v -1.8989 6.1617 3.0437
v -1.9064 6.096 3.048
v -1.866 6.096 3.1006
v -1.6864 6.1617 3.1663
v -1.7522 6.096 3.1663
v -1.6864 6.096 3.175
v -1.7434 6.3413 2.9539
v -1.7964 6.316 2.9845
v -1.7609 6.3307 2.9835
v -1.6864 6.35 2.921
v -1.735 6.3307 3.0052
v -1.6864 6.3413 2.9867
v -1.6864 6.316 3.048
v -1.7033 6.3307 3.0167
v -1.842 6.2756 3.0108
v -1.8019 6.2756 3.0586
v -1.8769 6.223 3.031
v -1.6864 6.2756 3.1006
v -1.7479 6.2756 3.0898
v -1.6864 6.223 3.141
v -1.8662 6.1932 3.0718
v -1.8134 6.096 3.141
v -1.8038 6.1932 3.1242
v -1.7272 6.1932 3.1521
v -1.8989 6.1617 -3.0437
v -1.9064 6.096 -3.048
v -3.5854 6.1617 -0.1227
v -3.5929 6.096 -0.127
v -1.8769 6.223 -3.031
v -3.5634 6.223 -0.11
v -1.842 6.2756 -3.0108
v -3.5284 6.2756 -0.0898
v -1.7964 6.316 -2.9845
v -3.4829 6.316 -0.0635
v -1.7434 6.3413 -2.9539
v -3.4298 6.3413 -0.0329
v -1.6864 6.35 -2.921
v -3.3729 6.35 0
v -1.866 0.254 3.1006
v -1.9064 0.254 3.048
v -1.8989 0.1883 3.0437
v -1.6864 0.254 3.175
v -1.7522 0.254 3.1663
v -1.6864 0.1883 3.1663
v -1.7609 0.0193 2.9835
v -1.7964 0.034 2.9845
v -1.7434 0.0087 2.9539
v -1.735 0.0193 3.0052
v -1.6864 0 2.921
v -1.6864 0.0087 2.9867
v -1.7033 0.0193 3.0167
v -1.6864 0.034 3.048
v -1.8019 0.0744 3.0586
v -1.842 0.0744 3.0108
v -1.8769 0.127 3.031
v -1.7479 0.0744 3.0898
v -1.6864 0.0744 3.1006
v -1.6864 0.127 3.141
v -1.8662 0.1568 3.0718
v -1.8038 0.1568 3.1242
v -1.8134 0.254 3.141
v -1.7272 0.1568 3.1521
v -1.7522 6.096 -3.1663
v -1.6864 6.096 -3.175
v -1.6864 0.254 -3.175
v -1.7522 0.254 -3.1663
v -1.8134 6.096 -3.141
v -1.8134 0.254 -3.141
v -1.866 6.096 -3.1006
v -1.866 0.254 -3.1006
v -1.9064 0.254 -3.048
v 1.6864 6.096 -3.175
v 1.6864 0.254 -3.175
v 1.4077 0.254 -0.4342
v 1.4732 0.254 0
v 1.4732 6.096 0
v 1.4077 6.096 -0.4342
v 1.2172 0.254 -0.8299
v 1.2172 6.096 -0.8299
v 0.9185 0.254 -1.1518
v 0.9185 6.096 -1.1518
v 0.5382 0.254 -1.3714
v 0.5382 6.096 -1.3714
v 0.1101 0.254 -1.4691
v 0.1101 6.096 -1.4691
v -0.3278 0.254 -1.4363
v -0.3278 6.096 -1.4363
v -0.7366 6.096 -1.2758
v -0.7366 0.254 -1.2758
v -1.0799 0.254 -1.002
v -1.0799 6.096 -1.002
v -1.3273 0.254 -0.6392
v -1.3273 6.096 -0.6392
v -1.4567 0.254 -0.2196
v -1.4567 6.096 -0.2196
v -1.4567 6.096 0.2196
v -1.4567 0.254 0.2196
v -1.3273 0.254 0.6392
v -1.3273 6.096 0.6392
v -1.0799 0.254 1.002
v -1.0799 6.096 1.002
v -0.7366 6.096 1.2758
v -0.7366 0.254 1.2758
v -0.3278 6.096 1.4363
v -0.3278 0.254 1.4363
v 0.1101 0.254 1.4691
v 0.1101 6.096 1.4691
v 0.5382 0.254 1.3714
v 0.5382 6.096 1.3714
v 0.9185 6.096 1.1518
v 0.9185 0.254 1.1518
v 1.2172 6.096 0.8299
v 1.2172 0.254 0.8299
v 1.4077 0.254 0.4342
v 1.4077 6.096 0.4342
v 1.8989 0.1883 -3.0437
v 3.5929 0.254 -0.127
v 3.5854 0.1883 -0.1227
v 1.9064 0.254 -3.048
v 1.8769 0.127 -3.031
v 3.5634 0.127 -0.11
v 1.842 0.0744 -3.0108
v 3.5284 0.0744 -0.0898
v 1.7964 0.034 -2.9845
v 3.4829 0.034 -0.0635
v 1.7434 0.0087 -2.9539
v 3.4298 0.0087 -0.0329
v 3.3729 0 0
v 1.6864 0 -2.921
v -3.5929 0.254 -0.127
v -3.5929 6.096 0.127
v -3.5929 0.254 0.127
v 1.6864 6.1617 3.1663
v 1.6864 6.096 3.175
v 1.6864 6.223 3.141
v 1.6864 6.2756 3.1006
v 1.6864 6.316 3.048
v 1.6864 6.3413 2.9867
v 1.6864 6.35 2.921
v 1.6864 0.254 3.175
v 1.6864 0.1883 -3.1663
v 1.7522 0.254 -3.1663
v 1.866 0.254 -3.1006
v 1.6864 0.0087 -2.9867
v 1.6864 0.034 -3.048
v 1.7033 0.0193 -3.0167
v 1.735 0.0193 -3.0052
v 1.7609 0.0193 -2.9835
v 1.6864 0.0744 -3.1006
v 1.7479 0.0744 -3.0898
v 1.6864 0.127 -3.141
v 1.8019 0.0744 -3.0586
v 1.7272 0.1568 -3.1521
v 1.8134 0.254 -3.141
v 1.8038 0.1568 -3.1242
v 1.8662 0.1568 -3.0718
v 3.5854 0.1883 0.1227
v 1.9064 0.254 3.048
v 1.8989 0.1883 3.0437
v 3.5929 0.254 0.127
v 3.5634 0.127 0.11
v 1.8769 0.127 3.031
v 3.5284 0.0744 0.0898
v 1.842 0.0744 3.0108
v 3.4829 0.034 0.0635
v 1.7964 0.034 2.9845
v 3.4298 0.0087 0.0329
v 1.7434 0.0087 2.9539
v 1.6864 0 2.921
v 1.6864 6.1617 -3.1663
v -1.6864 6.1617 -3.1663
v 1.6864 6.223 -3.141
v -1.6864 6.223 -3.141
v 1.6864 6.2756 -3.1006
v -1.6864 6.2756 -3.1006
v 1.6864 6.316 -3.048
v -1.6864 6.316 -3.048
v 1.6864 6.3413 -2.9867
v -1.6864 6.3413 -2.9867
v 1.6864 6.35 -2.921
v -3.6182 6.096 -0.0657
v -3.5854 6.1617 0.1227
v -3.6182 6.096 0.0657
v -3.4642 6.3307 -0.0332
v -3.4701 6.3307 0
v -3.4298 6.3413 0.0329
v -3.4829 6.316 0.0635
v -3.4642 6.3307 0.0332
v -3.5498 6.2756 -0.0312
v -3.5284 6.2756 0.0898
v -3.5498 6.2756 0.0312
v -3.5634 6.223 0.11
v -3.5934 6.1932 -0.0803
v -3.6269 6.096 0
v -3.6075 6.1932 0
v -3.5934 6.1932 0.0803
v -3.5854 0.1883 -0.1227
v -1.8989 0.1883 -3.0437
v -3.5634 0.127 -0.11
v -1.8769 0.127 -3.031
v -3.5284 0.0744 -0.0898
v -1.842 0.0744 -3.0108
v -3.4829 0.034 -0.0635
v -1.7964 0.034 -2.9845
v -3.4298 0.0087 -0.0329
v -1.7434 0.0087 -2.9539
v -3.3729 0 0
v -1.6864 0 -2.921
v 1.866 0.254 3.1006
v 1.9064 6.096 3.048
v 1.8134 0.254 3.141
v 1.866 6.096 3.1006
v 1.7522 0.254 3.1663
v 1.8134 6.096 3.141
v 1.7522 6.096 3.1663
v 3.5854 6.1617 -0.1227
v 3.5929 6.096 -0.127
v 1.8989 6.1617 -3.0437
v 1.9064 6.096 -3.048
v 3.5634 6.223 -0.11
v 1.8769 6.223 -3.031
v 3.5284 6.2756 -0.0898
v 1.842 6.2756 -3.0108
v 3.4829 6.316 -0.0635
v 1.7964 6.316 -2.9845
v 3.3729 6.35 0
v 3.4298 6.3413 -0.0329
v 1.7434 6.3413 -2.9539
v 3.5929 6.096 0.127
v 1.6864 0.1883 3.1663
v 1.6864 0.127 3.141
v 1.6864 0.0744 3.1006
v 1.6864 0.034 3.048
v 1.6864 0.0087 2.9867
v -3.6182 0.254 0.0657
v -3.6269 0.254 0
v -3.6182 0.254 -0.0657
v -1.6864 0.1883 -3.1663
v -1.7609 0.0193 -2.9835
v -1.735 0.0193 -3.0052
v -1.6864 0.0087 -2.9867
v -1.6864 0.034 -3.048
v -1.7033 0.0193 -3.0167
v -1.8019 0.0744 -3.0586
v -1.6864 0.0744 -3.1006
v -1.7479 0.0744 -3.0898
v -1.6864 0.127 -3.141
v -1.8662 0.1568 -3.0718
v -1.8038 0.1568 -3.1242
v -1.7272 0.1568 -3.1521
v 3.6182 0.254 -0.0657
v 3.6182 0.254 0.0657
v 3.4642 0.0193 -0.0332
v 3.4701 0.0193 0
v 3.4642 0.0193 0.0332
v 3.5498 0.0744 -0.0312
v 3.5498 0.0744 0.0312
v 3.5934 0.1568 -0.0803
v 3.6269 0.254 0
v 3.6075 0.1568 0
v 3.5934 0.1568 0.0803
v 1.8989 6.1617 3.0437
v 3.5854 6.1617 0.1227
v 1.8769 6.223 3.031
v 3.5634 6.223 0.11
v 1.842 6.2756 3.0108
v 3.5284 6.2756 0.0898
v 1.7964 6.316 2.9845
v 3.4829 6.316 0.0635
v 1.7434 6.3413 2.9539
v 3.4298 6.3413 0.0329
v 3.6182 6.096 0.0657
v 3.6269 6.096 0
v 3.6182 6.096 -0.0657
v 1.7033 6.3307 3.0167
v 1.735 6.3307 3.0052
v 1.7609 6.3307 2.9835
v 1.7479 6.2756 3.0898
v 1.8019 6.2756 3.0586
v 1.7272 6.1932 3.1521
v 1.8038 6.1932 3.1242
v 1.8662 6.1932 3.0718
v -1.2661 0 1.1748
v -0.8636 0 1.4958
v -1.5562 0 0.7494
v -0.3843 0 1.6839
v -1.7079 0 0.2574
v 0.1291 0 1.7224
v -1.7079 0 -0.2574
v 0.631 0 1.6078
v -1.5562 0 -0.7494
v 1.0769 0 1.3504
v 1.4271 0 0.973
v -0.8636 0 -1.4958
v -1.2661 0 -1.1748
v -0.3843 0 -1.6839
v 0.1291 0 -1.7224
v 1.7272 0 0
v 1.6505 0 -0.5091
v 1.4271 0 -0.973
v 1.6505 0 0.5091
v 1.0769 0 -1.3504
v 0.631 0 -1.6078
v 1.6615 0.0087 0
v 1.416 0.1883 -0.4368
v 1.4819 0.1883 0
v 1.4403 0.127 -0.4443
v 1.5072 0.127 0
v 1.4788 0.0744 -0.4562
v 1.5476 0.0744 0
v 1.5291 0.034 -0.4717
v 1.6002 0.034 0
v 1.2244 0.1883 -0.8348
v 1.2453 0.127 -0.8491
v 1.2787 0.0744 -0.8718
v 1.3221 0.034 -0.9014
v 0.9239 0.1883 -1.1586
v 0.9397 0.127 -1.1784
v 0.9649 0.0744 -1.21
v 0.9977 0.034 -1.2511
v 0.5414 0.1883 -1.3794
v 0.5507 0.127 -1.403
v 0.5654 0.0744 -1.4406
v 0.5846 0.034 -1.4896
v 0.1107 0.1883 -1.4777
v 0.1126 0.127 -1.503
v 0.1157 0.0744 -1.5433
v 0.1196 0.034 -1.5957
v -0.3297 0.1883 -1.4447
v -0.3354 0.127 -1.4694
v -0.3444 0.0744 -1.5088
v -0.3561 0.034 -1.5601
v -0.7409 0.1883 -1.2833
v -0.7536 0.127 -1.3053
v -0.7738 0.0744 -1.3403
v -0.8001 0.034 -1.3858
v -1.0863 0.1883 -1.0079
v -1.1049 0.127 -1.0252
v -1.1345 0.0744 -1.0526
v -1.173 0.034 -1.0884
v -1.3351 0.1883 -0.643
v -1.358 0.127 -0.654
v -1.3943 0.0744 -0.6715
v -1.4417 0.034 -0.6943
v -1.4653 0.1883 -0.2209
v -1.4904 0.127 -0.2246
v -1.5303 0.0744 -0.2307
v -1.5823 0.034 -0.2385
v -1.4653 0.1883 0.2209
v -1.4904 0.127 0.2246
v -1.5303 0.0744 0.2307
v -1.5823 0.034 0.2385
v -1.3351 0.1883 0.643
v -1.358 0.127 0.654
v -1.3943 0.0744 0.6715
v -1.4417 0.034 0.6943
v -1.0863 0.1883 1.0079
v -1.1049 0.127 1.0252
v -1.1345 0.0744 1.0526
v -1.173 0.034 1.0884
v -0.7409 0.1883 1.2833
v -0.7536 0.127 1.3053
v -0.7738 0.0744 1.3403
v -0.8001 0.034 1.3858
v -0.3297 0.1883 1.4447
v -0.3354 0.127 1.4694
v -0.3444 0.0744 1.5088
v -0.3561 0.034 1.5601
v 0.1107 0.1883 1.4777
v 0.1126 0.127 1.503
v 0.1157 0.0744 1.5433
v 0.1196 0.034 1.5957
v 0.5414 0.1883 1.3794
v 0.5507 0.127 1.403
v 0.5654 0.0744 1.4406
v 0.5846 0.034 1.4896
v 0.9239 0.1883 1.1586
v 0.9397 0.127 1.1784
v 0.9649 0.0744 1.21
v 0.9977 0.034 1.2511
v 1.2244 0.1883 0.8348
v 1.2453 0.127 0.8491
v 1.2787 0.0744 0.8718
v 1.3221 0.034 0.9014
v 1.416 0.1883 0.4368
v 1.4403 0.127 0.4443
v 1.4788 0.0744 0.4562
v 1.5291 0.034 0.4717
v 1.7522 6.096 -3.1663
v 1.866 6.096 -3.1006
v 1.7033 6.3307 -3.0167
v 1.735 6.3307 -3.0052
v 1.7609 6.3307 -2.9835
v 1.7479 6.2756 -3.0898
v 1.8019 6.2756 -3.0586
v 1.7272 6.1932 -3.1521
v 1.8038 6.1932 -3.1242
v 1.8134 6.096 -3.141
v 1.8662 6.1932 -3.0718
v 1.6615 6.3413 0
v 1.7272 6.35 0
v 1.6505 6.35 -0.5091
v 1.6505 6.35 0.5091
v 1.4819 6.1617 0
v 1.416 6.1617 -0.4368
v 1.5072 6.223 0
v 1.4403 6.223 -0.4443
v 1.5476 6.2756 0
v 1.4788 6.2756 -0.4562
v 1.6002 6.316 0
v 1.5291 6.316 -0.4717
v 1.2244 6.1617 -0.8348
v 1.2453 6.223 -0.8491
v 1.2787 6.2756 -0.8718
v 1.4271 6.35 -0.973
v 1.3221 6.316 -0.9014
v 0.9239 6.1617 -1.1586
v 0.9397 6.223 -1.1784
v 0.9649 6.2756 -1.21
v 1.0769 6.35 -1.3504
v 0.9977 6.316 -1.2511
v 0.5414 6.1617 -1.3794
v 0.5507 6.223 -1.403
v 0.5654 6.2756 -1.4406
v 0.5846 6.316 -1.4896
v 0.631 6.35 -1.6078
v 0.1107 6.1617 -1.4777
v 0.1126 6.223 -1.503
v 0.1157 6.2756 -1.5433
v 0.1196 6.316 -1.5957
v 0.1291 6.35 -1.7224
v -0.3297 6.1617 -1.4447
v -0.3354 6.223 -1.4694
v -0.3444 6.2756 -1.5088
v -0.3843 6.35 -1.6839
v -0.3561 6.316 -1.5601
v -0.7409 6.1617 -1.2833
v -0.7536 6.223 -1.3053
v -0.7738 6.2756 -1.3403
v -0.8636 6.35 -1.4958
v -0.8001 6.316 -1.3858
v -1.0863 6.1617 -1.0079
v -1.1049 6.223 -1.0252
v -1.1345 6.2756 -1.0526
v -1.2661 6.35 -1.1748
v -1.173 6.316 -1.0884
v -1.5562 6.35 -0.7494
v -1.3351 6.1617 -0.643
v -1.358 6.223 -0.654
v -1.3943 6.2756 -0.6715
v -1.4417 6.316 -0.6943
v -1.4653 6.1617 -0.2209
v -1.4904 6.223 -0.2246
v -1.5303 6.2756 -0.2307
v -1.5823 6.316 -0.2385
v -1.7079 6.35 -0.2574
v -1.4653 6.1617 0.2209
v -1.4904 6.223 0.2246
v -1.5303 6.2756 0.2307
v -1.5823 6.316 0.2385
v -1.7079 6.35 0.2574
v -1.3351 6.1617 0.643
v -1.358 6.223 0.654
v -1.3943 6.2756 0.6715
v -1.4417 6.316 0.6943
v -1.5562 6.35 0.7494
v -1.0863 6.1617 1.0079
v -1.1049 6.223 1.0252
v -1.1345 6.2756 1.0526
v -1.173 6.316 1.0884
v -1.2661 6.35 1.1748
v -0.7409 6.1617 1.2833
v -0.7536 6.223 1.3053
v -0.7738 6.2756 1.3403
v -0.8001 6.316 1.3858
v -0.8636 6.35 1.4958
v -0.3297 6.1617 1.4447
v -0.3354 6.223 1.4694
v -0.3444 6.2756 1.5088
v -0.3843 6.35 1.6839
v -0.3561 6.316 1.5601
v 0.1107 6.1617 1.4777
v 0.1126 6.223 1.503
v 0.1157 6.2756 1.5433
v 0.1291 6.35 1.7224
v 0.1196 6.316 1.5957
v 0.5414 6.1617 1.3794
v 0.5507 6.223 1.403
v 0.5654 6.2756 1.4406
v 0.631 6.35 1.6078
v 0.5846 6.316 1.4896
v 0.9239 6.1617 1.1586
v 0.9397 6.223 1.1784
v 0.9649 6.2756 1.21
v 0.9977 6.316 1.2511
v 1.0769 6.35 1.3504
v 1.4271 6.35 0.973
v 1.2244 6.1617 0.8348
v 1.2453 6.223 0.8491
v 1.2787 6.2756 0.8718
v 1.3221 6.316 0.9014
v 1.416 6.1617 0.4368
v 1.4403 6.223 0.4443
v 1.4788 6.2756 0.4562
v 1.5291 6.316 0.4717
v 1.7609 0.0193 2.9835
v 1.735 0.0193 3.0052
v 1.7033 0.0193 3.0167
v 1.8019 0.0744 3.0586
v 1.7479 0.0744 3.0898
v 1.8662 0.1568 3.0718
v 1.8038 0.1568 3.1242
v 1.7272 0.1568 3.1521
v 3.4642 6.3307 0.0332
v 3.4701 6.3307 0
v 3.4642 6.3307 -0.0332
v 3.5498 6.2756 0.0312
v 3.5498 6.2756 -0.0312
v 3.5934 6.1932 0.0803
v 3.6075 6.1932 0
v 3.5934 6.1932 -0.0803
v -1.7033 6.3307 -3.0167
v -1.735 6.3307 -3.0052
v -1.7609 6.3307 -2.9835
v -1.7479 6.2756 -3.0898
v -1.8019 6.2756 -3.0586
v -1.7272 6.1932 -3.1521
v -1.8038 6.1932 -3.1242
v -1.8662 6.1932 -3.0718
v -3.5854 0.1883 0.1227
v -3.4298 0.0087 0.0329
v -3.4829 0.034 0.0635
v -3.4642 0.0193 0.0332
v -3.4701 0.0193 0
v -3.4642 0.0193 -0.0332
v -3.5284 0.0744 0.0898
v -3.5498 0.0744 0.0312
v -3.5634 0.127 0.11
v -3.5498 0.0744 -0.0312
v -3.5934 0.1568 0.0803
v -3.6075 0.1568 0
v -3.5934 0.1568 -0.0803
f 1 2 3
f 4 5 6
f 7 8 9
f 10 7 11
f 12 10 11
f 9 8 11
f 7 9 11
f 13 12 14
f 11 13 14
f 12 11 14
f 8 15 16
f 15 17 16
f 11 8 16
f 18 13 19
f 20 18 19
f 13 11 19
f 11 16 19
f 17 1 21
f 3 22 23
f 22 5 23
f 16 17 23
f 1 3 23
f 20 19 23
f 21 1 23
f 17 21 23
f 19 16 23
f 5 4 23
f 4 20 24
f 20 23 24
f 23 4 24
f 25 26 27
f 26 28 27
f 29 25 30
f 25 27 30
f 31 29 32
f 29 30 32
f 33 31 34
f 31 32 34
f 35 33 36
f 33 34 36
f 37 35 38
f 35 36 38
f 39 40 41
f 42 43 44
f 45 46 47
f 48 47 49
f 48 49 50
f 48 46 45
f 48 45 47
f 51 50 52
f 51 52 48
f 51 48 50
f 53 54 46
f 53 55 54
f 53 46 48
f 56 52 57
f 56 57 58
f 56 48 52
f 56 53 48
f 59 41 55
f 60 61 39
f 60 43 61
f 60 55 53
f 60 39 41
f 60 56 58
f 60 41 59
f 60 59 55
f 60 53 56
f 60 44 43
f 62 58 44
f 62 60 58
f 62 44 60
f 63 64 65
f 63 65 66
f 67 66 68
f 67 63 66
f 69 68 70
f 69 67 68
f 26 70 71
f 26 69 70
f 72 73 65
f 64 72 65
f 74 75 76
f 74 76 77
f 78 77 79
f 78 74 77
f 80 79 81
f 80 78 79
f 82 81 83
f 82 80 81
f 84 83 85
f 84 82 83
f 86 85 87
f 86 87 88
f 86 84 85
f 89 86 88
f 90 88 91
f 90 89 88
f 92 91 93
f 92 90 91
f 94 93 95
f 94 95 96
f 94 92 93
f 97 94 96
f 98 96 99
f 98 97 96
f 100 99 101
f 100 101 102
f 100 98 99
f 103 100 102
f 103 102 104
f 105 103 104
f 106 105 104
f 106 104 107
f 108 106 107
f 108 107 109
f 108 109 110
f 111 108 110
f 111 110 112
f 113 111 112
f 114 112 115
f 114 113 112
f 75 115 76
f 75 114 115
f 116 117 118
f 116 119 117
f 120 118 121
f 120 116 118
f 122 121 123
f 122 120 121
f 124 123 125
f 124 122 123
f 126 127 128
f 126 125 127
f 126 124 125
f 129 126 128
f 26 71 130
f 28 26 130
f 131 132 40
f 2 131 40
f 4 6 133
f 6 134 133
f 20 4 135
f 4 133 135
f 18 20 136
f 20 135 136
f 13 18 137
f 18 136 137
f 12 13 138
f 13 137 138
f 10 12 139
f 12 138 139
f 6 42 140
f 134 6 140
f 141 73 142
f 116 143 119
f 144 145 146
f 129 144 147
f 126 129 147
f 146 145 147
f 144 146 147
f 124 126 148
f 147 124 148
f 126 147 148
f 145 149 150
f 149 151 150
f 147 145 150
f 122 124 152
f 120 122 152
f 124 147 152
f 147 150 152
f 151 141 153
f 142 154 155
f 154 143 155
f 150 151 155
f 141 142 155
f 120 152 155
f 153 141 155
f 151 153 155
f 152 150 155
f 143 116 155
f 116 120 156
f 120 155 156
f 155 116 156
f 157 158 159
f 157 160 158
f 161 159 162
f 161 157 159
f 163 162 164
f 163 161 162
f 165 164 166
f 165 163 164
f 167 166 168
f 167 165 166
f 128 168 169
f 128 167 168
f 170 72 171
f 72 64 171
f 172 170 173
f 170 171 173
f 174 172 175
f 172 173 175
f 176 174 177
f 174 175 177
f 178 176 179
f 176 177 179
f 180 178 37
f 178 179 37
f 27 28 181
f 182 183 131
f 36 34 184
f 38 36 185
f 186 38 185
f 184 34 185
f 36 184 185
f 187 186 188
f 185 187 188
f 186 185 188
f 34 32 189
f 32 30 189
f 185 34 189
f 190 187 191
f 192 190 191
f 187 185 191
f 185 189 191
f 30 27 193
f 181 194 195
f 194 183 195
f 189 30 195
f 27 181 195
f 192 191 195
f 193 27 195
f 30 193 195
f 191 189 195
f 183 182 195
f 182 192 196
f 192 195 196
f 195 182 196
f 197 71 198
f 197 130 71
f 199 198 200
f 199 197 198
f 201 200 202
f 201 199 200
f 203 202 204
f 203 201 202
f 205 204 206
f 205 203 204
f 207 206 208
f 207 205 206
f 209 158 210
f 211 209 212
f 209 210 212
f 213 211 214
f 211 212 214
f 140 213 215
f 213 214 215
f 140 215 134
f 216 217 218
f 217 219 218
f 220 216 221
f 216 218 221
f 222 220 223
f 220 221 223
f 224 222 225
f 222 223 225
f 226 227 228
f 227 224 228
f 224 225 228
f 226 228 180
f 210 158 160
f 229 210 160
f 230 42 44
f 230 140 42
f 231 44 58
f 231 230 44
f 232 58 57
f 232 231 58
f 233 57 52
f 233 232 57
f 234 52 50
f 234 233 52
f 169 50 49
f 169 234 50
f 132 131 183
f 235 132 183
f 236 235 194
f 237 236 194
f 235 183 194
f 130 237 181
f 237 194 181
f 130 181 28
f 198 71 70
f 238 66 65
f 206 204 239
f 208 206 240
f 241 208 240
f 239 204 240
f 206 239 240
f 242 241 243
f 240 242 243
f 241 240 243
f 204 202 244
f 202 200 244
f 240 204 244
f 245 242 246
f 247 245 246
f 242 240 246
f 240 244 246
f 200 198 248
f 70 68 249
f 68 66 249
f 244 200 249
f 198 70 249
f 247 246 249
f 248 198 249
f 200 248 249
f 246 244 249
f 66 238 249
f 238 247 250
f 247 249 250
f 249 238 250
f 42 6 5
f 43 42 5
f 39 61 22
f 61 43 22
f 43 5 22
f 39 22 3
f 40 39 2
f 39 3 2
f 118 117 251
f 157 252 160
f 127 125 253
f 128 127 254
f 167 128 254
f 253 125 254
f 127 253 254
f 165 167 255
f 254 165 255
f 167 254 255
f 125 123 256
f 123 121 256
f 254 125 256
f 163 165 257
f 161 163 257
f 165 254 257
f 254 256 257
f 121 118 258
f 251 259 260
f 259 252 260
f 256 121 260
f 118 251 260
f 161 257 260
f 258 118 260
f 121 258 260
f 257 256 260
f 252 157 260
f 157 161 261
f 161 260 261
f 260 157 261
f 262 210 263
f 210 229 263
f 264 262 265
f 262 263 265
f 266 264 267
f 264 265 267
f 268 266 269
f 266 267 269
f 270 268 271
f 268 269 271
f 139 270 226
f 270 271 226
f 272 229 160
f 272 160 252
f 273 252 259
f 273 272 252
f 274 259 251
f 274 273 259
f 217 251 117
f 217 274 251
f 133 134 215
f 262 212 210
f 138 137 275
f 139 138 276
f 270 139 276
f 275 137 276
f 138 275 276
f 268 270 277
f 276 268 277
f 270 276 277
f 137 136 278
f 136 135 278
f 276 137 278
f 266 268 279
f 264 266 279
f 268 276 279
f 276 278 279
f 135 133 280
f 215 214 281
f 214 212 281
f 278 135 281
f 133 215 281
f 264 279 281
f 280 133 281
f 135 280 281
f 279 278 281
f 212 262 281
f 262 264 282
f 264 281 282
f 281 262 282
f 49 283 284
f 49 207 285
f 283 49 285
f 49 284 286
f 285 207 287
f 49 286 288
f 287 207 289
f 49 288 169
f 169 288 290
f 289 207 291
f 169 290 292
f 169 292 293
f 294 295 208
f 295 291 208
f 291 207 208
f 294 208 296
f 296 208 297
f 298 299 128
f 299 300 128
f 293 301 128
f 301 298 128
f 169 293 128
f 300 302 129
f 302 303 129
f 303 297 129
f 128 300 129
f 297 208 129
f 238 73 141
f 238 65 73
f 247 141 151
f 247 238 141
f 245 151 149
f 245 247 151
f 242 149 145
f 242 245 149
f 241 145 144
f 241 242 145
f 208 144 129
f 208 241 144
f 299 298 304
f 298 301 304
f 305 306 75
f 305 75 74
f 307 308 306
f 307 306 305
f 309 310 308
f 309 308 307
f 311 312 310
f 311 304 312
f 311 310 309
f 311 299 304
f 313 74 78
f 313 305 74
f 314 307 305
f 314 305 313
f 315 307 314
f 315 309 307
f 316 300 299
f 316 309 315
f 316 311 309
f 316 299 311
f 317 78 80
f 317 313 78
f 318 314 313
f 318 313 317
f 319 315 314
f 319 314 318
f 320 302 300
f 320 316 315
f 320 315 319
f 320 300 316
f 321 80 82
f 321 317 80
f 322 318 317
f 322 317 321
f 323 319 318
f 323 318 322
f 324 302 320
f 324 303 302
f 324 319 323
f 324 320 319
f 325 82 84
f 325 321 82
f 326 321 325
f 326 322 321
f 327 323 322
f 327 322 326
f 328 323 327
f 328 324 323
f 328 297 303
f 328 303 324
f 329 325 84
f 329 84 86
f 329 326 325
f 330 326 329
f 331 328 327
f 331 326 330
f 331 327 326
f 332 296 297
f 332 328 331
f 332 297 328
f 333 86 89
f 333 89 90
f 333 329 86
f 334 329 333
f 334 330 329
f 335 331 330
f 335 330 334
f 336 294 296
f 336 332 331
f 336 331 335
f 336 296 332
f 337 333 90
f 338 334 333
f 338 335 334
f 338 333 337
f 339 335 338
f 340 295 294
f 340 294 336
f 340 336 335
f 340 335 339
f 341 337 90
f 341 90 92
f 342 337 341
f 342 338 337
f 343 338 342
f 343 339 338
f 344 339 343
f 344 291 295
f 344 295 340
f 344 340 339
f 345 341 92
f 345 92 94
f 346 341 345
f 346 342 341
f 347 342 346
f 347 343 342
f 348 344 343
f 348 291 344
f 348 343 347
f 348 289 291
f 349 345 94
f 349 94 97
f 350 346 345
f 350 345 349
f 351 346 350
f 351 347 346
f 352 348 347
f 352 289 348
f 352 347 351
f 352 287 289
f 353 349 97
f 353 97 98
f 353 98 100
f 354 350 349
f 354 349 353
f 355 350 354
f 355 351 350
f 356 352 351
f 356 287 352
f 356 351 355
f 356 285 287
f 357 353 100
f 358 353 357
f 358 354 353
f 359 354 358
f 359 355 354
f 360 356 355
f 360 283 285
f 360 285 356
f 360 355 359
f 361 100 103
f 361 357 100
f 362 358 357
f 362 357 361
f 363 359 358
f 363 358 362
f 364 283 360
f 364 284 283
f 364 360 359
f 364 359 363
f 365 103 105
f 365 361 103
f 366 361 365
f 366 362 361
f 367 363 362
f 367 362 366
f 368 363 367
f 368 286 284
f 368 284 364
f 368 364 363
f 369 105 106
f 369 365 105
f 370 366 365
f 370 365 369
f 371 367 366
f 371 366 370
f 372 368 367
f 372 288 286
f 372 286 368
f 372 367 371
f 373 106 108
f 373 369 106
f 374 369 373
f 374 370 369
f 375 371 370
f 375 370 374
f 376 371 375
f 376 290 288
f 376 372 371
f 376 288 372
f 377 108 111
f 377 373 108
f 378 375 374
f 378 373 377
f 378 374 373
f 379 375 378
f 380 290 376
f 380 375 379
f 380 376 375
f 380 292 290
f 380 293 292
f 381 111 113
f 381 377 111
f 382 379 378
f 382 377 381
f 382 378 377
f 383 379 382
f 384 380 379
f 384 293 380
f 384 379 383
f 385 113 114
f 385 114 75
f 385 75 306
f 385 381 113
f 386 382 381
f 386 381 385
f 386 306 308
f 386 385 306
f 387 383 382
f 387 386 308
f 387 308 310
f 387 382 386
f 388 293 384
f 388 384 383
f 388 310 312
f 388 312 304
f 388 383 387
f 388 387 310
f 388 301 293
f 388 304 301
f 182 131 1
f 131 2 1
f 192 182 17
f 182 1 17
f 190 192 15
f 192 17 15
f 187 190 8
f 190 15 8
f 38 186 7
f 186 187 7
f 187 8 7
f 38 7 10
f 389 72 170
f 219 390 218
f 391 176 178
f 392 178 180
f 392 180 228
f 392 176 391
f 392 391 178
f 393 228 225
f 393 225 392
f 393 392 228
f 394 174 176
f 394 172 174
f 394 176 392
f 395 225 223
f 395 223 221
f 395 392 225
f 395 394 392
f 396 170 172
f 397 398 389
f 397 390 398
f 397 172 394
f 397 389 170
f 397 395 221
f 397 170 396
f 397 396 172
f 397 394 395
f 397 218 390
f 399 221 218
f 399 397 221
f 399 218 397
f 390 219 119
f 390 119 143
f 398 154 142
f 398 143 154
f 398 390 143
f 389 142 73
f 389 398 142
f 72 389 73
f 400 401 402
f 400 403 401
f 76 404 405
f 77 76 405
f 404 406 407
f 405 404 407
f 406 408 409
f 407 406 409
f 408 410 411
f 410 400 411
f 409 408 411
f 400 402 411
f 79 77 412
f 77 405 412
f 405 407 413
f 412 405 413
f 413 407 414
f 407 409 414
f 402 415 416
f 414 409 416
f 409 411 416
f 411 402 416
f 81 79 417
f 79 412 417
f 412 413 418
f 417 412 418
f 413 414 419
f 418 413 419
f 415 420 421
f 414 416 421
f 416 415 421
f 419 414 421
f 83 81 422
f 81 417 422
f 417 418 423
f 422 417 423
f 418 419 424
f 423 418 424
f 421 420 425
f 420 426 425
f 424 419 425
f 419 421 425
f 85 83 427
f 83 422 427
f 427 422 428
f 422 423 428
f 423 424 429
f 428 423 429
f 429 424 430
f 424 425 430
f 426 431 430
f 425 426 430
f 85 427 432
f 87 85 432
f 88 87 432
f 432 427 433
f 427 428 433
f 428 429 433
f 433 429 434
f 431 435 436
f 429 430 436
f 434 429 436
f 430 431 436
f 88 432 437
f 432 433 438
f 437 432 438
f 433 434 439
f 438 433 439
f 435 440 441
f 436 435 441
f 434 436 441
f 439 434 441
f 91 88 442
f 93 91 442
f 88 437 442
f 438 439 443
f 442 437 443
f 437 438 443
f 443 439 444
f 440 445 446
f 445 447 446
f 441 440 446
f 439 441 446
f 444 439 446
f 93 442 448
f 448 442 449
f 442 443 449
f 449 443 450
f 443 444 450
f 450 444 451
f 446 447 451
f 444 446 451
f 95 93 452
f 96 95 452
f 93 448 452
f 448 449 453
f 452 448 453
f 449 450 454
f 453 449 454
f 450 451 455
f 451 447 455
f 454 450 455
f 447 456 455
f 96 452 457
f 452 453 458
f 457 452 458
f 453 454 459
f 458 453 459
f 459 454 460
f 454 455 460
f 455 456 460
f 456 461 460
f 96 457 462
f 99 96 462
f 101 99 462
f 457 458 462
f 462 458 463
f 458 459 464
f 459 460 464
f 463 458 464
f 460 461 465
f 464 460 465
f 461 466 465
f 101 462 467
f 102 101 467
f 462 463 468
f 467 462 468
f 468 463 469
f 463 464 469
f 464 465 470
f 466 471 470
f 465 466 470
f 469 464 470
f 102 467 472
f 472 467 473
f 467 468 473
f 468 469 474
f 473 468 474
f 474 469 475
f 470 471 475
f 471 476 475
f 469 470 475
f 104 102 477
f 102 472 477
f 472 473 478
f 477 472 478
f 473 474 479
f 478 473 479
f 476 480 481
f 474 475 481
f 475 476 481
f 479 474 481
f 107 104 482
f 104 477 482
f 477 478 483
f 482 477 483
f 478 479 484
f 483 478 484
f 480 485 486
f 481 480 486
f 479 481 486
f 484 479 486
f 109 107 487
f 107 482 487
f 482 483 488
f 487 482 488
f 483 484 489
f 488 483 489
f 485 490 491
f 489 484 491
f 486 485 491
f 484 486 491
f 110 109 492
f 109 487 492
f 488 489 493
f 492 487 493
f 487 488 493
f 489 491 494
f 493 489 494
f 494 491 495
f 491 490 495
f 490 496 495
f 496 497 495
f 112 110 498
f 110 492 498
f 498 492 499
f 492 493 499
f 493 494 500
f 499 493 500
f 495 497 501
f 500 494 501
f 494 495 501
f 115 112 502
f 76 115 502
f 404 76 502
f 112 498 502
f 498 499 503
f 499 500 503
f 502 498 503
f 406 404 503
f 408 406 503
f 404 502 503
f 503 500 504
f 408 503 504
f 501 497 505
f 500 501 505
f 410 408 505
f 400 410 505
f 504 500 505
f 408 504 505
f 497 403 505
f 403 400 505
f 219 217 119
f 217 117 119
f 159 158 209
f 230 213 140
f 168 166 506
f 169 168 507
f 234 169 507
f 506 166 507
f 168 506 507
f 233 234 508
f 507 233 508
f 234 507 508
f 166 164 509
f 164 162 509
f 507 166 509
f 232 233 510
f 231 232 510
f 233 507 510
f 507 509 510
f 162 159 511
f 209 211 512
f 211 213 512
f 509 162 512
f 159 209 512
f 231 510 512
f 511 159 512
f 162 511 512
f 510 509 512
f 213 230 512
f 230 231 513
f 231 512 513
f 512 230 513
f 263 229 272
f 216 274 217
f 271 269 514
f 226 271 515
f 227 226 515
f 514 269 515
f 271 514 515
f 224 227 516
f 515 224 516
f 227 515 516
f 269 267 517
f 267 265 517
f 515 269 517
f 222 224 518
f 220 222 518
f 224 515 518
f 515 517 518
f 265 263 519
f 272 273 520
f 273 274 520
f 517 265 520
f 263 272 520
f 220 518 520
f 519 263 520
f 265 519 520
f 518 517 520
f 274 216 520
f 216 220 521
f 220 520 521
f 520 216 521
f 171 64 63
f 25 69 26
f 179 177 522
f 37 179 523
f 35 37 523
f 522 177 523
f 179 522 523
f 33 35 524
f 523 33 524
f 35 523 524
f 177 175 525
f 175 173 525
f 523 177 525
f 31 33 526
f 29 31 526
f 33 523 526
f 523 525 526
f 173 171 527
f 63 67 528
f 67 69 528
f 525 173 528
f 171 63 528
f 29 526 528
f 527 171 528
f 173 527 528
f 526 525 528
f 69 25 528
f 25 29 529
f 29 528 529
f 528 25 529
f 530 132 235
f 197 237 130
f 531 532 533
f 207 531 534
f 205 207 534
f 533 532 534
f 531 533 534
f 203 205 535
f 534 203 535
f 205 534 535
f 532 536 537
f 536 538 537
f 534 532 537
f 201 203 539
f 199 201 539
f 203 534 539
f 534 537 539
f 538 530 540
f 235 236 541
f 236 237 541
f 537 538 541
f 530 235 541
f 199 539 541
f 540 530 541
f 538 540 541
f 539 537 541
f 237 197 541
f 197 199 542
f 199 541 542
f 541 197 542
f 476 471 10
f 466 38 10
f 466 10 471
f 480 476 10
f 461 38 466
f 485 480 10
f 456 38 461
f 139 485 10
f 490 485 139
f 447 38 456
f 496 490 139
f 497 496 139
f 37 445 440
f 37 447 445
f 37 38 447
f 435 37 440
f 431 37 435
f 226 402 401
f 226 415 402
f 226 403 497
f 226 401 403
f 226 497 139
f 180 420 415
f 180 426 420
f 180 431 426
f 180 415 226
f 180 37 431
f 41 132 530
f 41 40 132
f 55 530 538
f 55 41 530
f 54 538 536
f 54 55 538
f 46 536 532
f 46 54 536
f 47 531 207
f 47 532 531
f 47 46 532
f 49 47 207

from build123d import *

# Parameters (mm, degrees)
SKETCH1_R           = 1.4732
BOSS_EXTRUDE1_DEPTH = 6.35
FILLET1_R           = 0.254


with BuildPart() as part:
    # Sketch1 → Boss-Extrude1 (new body)
    with BuildSketch(Plane(origin=(0, 0, 0), x_dir=(1, 0, 0), z_dir=(0, 1, 0))):
        Polygon((1.833087105, -3.175), (3.666174209, 0), (1.833087105, 3.175), (-1.833087105, 3.175), (-3.666174209, 0), (-1.833087105, -3.175), align=None)
        Circle(SKETCH1_R, mode=Mode.SUBTRACT)
    extrude(amount=BOSS_EXTRUDE1_DEPTH)

    # Fillet1
    fillet1_edges = [part.edges().sort_by_distance(p)[0] for p in [
        (2.749630657, 6.35, -1.5875),
        (-1.833087105, 3.175, 3.175),
        (-3.666174209, 3.175, 0),
        (-1.833087105, 3.175, -3.175),
        (1.833087105, 3.175, -3.175),
        (3.666174209, 3.175, 0),
        (1.833087105, 3.175, 3.175),
        (0, 6.35, -3.175),
        (-2.749630657, 6.35, -1.5875),
        (-1.4732, 0, 0),
        (-1.4732, 6.35, 0),
        (-2.749630657, 6.35, 1.5875),
        (0, 6.35, 3.175),
        (-2.749630657, 0, 1.5875),
        (-2.749630657, 0, -1.5875),
        (0, 0, -3.175),
        (2.749630657, 6.35, 1.5875),
        (2.749630657, 0, -1.5875),
        (2.749630657, 0, 1.5875),
        (0, 0, 3.175),
    ]]
    fillet(fillet1_edges, radius=FILLET1_R)


solid = part.part
